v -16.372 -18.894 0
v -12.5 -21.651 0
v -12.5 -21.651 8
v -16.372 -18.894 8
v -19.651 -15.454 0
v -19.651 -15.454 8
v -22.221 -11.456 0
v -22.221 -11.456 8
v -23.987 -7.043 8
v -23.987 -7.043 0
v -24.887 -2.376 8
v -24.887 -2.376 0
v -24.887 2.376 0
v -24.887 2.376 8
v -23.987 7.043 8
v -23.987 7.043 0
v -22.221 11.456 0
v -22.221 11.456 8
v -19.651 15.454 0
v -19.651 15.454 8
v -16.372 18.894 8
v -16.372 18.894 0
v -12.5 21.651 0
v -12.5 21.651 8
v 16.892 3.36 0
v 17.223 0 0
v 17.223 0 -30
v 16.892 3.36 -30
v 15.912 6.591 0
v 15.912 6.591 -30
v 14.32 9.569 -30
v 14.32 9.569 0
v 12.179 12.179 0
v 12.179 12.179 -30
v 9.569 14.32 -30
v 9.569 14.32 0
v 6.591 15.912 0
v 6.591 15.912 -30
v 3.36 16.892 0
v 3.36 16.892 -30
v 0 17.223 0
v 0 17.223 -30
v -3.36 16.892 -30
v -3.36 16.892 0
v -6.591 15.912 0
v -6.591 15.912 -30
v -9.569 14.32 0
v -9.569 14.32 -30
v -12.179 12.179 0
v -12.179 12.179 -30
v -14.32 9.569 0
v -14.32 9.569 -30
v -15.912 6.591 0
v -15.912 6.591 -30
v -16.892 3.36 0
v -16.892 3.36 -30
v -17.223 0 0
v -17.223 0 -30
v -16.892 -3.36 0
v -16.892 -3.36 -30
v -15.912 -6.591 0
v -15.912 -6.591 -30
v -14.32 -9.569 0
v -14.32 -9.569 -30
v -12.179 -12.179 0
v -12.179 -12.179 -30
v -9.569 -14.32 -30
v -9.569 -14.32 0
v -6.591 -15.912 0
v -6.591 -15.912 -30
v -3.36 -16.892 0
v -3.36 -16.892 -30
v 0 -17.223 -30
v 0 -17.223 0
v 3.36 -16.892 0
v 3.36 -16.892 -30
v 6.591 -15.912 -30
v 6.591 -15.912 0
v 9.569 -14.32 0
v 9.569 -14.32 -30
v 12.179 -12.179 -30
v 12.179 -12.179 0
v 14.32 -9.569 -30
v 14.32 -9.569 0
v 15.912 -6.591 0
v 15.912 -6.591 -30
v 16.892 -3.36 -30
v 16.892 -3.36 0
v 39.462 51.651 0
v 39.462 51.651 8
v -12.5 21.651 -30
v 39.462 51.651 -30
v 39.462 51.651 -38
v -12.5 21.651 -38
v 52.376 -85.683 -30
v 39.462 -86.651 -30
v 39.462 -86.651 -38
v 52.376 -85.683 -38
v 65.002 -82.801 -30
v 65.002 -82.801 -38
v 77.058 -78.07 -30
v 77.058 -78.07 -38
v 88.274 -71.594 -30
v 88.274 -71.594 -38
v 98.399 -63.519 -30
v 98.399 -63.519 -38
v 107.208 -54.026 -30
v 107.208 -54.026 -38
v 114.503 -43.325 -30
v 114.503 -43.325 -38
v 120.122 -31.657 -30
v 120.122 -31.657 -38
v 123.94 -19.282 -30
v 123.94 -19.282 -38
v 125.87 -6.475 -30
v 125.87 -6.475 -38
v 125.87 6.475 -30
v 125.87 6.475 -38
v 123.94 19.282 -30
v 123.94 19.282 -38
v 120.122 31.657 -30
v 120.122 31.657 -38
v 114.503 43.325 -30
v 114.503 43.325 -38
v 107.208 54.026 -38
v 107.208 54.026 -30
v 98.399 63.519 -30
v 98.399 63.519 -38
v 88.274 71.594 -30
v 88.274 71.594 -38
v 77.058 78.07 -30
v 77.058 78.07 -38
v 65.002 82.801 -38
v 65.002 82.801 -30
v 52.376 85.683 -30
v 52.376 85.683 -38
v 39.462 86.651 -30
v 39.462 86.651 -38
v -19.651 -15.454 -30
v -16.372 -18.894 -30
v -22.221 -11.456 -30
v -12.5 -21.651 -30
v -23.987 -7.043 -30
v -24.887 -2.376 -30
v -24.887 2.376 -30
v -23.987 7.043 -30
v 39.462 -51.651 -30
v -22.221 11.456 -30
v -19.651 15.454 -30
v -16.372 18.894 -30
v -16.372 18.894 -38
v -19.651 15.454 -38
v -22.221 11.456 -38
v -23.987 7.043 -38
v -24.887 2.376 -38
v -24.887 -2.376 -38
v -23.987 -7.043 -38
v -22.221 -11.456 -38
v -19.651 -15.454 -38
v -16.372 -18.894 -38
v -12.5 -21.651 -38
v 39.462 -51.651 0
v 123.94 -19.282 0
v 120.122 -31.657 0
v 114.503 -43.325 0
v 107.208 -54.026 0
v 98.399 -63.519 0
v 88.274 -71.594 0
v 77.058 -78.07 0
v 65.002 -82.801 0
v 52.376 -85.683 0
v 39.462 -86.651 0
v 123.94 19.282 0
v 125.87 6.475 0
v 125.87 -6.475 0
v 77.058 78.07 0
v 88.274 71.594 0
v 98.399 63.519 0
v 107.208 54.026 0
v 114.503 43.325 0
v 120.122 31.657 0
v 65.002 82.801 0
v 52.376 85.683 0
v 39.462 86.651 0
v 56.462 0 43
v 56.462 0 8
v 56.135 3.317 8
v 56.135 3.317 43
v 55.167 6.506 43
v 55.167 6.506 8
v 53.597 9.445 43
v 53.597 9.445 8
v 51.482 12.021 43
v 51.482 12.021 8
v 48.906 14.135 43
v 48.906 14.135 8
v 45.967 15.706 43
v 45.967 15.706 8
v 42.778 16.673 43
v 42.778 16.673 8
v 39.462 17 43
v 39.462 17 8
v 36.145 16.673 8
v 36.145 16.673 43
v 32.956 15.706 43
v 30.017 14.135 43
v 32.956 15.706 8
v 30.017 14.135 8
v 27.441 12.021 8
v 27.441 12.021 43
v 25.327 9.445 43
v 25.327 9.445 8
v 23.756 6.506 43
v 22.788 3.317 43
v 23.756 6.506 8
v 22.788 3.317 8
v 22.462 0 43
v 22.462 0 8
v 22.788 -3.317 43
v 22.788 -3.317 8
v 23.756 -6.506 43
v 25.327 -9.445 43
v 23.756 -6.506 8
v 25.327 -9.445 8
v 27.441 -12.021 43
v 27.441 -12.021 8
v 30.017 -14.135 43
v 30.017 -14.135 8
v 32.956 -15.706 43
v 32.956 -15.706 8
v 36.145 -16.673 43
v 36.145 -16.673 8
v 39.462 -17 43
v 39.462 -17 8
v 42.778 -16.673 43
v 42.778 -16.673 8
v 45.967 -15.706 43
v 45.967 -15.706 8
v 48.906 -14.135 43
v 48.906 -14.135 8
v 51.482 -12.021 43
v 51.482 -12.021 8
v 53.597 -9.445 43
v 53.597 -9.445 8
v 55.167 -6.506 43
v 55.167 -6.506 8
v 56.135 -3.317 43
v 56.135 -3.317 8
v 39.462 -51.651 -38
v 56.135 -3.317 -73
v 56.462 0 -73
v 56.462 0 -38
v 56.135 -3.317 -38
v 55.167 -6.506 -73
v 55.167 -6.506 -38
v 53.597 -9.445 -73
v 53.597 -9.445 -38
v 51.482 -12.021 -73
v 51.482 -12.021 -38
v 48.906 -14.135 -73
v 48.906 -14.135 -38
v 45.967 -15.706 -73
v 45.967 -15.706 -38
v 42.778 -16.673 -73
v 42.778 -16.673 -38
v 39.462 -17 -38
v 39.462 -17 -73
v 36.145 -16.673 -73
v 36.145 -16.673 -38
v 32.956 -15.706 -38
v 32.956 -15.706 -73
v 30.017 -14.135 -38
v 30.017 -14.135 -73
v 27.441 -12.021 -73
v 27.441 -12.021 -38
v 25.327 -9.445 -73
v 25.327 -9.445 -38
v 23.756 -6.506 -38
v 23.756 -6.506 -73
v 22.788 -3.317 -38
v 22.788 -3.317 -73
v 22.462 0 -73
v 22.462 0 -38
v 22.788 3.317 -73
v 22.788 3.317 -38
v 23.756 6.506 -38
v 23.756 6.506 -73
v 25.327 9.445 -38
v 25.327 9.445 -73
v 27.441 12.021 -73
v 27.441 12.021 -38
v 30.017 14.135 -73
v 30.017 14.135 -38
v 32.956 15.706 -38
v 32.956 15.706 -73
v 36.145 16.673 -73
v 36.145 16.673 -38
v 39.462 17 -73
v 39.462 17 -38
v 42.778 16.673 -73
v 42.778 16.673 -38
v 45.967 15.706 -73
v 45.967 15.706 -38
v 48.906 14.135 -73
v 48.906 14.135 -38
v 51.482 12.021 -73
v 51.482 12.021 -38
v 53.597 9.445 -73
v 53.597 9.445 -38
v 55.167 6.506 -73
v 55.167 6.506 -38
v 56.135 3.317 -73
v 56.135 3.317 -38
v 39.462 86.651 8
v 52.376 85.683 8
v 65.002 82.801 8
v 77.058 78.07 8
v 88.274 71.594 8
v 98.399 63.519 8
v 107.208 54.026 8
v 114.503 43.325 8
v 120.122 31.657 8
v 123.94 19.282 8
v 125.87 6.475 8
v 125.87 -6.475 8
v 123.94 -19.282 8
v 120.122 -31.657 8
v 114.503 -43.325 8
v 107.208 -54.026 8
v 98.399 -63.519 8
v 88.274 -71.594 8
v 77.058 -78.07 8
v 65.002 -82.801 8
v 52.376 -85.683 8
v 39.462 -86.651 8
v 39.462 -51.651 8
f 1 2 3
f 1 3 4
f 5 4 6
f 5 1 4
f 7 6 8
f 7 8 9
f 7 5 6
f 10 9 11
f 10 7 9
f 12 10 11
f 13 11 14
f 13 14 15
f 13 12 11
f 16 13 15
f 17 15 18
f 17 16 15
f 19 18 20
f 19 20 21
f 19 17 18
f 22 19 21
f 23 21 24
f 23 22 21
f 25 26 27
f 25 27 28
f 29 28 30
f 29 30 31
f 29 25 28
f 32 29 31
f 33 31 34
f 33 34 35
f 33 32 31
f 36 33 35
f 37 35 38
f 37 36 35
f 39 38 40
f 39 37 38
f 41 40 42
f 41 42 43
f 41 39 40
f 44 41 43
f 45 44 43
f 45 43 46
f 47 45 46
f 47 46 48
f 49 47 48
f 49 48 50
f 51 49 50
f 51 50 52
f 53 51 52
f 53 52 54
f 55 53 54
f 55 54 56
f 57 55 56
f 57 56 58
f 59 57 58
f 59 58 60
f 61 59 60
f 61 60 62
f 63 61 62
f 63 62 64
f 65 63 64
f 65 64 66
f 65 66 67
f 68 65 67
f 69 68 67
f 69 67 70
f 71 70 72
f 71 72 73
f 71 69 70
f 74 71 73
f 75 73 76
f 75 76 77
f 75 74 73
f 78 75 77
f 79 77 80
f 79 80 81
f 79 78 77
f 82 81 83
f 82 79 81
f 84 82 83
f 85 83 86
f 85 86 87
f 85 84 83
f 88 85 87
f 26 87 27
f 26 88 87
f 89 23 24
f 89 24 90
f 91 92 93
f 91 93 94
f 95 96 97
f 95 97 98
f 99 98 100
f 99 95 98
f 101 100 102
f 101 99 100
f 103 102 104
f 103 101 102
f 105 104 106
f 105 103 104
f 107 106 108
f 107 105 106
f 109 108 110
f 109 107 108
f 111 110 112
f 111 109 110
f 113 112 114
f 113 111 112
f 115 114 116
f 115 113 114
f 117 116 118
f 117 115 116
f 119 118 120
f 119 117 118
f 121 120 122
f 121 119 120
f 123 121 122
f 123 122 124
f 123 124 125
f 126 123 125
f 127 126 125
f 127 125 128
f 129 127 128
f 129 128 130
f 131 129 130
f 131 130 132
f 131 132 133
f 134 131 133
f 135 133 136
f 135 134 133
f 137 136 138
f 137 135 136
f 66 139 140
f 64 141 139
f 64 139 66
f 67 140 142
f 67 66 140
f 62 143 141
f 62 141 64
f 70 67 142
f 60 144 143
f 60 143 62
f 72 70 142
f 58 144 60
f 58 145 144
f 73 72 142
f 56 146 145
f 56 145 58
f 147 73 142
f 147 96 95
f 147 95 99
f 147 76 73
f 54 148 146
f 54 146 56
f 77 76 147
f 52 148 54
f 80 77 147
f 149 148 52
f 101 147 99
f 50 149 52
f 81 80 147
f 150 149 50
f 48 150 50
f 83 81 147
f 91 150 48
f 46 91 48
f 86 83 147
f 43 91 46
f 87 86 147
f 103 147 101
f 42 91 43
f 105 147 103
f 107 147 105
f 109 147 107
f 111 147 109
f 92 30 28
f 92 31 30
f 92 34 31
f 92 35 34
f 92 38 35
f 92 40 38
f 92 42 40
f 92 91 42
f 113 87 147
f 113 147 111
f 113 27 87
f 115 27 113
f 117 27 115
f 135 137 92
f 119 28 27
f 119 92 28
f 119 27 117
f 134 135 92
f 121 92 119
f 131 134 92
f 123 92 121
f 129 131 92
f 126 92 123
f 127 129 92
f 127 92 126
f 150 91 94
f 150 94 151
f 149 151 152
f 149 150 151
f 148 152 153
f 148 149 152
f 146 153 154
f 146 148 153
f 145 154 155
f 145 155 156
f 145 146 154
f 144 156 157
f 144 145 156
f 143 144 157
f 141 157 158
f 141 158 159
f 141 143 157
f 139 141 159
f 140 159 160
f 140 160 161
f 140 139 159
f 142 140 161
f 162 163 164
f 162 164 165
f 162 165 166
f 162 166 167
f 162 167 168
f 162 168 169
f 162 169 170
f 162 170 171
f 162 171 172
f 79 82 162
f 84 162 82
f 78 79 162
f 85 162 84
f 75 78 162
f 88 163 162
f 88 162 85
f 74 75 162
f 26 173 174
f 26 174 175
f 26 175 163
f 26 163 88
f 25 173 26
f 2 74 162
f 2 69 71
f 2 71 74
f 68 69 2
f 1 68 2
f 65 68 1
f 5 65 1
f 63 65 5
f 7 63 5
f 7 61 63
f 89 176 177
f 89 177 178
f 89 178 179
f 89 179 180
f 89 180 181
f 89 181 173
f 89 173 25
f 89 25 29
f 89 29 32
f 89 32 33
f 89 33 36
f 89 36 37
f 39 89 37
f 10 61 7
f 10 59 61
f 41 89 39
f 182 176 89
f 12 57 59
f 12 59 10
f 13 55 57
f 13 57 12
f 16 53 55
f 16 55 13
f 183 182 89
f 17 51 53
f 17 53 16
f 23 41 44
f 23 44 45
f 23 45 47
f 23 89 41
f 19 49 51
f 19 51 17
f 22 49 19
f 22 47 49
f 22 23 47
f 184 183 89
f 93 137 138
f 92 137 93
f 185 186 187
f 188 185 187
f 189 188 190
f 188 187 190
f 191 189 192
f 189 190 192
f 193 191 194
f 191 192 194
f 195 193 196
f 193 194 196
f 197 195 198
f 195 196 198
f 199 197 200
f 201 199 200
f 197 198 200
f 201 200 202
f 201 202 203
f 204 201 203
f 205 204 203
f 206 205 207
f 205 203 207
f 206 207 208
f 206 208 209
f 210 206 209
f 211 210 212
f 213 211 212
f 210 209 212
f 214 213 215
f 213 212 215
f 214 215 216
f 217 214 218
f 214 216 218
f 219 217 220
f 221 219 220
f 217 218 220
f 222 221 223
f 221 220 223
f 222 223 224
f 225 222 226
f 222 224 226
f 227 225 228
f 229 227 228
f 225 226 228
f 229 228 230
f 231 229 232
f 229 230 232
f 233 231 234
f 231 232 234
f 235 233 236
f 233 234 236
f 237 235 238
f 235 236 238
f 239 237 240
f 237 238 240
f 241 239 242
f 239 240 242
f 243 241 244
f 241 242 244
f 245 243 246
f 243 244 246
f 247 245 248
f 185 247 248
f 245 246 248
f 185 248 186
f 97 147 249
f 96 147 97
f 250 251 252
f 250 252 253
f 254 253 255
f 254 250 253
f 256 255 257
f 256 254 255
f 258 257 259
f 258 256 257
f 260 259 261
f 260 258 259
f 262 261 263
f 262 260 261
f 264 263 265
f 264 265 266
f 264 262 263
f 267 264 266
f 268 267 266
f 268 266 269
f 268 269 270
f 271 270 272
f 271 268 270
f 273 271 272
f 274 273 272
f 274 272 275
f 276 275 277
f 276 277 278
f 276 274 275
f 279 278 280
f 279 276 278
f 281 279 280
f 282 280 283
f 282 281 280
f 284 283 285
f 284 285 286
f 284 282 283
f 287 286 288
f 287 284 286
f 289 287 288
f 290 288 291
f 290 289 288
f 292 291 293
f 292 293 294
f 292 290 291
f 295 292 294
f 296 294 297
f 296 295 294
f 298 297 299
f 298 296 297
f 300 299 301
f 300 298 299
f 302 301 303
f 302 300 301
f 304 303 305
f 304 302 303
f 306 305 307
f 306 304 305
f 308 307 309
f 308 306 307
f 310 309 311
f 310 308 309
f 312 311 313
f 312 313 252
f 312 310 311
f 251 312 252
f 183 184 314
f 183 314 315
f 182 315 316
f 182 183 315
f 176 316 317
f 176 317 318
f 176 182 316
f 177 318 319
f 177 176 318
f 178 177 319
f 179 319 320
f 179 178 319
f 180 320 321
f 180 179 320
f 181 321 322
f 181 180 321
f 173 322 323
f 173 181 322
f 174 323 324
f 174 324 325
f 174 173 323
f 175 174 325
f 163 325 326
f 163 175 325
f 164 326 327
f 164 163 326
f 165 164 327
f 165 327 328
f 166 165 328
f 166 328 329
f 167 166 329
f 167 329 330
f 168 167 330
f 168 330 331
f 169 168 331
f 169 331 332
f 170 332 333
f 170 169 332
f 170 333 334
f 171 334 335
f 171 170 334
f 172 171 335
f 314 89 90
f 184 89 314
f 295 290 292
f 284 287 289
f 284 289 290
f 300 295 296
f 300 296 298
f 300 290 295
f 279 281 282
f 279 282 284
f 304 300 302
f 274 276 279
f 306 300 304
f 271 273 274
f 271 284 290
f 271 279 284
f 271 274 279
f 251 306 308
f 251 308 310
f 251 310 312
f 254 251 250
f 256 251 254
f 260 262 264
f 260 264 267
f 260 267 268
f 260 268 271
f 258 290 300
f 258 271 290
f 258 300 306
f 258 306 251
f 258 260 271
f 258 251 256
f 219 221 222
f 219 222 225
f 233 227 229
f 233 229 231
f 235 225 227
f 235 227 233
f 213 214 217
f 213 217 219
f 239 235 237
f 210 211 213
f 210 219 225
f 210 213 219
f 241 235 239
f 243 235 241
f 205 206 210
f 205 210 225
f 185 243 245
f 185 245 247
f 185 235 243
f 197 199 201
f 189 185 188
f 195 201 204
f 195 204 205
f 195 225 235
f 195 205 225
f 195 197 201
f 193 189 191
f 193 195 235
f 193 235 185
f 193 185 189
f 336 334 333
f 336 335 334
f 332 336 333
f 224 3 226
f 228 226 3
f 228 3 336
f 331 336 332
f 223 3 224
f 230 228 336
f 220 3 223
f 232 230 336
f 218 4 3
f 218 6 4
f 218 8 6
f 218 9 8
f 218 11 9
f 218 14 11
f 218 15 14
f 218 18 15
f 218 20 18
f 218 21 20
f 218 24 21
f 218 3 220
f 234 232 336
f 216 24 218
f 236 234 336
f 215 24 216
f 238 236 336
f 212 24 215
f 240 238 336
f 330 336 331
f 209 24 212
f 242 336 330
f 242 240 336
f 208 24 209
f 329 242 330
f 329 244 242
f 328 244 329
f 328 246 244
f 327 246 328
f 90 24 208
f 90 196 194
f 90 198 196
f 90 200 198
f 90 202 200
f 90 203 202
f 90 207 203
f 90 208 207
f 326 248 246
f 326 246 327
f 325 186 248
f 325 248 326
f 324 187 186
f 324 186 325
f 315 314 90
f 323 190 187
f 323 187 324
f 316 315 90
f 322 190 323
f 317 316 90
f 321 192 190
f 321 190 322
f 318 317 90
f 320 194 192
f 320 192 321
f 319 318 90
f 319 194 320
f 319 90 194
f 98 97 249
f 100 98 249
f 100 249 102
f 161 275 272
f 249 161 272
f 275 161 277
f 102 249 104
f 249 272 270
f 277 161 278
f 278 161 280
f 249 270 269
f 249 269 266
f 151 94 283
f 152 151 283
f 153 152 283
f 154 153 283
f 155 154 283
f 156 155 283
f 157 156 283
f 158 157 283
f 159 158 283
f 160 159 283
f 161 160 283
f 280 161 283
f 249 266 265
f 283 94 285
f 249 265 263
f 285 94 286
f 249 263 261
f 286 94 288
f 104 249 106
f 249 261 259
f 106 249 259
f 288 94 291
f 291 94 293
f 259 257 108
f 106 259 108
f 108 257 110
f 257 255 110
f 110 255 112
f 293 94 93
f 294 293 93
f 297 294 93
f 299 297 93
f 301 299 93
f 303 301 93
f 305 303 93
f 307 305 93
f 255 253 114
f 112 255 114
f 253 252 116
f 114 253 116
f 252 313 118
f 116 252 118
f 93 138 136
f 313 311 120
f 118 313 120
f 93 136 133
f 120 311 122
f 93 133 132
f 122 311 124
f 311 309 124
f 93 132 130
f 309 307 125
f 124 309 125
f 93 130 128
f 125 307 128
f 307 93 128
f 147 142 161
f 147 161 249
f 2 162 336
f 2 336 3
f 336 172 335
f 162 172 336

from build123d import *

# Parameters (mm, degrees)
BOSS_EXTRUDE1_DEPTH = 8
BOSS_EXTRUDE4_START = 30
BOSS_EXTRUDE4_DEPTH = 8
SKETCH7_R           = 17.223036208
BOSS_EXTRUDE5_DEPTH = 38
SKETCH8_R           = 17
BOSS_EXTRUDE6_DEPTH = 35
BOSS_EXTRUDE7_START = 35
SKETCH9_R           = 17
BOSS_EXTRUDE7_DEPTH = 35


with BuildPart() as part:
    # Sketch1 → Boss-Extrude1 (new body)
    with BuildSketch(Plane.XY):
        with BuildLine():
            Line((-12.5, 21.650635095), (39.461524227, 51.650635095))
            Line((39.461524227, 51.650635095), (39.461524227, 86.650635095))
            ThreePointArc((39.461524227, 86.650635095), (126.112159322, 0), (39.461524227, -86.650635095))
            Line((39.461524227, -86.650635095), (39.461524227, -51.650635095))
            Line((39.461524227, -51.650635095), (-12.5, -21.650635095))
            ThreePointArc((-12.5, -21.650635095), (-25, 0), (-12.5, 21.650635095))
        make_face()
    extrude(amount=BOSS_EXTRUDE1_DEPTH)



with BuildPart() as body_2:
    # Sketch5 → Boss-Extrude4 (new body)
    with BuildSketch(Plane(origin=(0, 0, 0), x_dir=(-1, 0, 0), z_dir=(0, 0, -1)).offset(BOSS_EXTRUDE4_START)):
        with BuildLine():
            Line((-39.461524227, 86.650635095), (-39.461524227, 51.650635095))
            Line((-39.461524227, 51.650635095), (12.5, 21.650635095))
            ThreePointArc((12.5, 21.650635095), (25, 0), (12.5, -21.650635095))
            Line((12.5, -21.650635095), (-39.461524227, -51.650635095))
            Line((-39.461524227, -51.650635095), (-39.461524227, -86.650635095))
            ThreePointArc((-39.461524227, -86.650635095), (-126.112159322, 0), (-39.461524227, 86.650635095))
        make_face()
    extrude(amount=BOSS_EXTRUDE4_DEPTH)


with BuildPart() as part_1:
    add(part.part)

    add(body_2.part)  # Boss-Extrude5 merges body 2
    # Sketch7 → Boss-Extrude5 (add)
    with BuildSketch(Plane.XY.offset(8)):
        Circle(SKETCH7_R)
    extrude(amount=-BOSS_EXTRUDE5_DEPTH)

    # Sketch8 → Boss-Extrude6 (add)
    with BuildSketch(Plane.XY.offset(8)):
        with Locations((39.461524227, 0)):
            Circle(SKETCH8_R)
    extrude(amount=BOSS_EXTRUDE6_DEPTH)

    # Sketch9 → Boss-Extrude7 (add)
    with BuildSketch(Plane(origin=(0, 0, -38), x_dir=(-1, 0, 0), z_dir=(0, 0, -1)).offset(BOSS_EXTRUDE7_START)):
        with Locations(Location((-39.461524227, 0, 0), (0, 0, 180))):
            Circle(SKETCH9_R)
    extrude(amount=-BOSS_EXTRUDE7_DEPTH)


solid = part_1.part
